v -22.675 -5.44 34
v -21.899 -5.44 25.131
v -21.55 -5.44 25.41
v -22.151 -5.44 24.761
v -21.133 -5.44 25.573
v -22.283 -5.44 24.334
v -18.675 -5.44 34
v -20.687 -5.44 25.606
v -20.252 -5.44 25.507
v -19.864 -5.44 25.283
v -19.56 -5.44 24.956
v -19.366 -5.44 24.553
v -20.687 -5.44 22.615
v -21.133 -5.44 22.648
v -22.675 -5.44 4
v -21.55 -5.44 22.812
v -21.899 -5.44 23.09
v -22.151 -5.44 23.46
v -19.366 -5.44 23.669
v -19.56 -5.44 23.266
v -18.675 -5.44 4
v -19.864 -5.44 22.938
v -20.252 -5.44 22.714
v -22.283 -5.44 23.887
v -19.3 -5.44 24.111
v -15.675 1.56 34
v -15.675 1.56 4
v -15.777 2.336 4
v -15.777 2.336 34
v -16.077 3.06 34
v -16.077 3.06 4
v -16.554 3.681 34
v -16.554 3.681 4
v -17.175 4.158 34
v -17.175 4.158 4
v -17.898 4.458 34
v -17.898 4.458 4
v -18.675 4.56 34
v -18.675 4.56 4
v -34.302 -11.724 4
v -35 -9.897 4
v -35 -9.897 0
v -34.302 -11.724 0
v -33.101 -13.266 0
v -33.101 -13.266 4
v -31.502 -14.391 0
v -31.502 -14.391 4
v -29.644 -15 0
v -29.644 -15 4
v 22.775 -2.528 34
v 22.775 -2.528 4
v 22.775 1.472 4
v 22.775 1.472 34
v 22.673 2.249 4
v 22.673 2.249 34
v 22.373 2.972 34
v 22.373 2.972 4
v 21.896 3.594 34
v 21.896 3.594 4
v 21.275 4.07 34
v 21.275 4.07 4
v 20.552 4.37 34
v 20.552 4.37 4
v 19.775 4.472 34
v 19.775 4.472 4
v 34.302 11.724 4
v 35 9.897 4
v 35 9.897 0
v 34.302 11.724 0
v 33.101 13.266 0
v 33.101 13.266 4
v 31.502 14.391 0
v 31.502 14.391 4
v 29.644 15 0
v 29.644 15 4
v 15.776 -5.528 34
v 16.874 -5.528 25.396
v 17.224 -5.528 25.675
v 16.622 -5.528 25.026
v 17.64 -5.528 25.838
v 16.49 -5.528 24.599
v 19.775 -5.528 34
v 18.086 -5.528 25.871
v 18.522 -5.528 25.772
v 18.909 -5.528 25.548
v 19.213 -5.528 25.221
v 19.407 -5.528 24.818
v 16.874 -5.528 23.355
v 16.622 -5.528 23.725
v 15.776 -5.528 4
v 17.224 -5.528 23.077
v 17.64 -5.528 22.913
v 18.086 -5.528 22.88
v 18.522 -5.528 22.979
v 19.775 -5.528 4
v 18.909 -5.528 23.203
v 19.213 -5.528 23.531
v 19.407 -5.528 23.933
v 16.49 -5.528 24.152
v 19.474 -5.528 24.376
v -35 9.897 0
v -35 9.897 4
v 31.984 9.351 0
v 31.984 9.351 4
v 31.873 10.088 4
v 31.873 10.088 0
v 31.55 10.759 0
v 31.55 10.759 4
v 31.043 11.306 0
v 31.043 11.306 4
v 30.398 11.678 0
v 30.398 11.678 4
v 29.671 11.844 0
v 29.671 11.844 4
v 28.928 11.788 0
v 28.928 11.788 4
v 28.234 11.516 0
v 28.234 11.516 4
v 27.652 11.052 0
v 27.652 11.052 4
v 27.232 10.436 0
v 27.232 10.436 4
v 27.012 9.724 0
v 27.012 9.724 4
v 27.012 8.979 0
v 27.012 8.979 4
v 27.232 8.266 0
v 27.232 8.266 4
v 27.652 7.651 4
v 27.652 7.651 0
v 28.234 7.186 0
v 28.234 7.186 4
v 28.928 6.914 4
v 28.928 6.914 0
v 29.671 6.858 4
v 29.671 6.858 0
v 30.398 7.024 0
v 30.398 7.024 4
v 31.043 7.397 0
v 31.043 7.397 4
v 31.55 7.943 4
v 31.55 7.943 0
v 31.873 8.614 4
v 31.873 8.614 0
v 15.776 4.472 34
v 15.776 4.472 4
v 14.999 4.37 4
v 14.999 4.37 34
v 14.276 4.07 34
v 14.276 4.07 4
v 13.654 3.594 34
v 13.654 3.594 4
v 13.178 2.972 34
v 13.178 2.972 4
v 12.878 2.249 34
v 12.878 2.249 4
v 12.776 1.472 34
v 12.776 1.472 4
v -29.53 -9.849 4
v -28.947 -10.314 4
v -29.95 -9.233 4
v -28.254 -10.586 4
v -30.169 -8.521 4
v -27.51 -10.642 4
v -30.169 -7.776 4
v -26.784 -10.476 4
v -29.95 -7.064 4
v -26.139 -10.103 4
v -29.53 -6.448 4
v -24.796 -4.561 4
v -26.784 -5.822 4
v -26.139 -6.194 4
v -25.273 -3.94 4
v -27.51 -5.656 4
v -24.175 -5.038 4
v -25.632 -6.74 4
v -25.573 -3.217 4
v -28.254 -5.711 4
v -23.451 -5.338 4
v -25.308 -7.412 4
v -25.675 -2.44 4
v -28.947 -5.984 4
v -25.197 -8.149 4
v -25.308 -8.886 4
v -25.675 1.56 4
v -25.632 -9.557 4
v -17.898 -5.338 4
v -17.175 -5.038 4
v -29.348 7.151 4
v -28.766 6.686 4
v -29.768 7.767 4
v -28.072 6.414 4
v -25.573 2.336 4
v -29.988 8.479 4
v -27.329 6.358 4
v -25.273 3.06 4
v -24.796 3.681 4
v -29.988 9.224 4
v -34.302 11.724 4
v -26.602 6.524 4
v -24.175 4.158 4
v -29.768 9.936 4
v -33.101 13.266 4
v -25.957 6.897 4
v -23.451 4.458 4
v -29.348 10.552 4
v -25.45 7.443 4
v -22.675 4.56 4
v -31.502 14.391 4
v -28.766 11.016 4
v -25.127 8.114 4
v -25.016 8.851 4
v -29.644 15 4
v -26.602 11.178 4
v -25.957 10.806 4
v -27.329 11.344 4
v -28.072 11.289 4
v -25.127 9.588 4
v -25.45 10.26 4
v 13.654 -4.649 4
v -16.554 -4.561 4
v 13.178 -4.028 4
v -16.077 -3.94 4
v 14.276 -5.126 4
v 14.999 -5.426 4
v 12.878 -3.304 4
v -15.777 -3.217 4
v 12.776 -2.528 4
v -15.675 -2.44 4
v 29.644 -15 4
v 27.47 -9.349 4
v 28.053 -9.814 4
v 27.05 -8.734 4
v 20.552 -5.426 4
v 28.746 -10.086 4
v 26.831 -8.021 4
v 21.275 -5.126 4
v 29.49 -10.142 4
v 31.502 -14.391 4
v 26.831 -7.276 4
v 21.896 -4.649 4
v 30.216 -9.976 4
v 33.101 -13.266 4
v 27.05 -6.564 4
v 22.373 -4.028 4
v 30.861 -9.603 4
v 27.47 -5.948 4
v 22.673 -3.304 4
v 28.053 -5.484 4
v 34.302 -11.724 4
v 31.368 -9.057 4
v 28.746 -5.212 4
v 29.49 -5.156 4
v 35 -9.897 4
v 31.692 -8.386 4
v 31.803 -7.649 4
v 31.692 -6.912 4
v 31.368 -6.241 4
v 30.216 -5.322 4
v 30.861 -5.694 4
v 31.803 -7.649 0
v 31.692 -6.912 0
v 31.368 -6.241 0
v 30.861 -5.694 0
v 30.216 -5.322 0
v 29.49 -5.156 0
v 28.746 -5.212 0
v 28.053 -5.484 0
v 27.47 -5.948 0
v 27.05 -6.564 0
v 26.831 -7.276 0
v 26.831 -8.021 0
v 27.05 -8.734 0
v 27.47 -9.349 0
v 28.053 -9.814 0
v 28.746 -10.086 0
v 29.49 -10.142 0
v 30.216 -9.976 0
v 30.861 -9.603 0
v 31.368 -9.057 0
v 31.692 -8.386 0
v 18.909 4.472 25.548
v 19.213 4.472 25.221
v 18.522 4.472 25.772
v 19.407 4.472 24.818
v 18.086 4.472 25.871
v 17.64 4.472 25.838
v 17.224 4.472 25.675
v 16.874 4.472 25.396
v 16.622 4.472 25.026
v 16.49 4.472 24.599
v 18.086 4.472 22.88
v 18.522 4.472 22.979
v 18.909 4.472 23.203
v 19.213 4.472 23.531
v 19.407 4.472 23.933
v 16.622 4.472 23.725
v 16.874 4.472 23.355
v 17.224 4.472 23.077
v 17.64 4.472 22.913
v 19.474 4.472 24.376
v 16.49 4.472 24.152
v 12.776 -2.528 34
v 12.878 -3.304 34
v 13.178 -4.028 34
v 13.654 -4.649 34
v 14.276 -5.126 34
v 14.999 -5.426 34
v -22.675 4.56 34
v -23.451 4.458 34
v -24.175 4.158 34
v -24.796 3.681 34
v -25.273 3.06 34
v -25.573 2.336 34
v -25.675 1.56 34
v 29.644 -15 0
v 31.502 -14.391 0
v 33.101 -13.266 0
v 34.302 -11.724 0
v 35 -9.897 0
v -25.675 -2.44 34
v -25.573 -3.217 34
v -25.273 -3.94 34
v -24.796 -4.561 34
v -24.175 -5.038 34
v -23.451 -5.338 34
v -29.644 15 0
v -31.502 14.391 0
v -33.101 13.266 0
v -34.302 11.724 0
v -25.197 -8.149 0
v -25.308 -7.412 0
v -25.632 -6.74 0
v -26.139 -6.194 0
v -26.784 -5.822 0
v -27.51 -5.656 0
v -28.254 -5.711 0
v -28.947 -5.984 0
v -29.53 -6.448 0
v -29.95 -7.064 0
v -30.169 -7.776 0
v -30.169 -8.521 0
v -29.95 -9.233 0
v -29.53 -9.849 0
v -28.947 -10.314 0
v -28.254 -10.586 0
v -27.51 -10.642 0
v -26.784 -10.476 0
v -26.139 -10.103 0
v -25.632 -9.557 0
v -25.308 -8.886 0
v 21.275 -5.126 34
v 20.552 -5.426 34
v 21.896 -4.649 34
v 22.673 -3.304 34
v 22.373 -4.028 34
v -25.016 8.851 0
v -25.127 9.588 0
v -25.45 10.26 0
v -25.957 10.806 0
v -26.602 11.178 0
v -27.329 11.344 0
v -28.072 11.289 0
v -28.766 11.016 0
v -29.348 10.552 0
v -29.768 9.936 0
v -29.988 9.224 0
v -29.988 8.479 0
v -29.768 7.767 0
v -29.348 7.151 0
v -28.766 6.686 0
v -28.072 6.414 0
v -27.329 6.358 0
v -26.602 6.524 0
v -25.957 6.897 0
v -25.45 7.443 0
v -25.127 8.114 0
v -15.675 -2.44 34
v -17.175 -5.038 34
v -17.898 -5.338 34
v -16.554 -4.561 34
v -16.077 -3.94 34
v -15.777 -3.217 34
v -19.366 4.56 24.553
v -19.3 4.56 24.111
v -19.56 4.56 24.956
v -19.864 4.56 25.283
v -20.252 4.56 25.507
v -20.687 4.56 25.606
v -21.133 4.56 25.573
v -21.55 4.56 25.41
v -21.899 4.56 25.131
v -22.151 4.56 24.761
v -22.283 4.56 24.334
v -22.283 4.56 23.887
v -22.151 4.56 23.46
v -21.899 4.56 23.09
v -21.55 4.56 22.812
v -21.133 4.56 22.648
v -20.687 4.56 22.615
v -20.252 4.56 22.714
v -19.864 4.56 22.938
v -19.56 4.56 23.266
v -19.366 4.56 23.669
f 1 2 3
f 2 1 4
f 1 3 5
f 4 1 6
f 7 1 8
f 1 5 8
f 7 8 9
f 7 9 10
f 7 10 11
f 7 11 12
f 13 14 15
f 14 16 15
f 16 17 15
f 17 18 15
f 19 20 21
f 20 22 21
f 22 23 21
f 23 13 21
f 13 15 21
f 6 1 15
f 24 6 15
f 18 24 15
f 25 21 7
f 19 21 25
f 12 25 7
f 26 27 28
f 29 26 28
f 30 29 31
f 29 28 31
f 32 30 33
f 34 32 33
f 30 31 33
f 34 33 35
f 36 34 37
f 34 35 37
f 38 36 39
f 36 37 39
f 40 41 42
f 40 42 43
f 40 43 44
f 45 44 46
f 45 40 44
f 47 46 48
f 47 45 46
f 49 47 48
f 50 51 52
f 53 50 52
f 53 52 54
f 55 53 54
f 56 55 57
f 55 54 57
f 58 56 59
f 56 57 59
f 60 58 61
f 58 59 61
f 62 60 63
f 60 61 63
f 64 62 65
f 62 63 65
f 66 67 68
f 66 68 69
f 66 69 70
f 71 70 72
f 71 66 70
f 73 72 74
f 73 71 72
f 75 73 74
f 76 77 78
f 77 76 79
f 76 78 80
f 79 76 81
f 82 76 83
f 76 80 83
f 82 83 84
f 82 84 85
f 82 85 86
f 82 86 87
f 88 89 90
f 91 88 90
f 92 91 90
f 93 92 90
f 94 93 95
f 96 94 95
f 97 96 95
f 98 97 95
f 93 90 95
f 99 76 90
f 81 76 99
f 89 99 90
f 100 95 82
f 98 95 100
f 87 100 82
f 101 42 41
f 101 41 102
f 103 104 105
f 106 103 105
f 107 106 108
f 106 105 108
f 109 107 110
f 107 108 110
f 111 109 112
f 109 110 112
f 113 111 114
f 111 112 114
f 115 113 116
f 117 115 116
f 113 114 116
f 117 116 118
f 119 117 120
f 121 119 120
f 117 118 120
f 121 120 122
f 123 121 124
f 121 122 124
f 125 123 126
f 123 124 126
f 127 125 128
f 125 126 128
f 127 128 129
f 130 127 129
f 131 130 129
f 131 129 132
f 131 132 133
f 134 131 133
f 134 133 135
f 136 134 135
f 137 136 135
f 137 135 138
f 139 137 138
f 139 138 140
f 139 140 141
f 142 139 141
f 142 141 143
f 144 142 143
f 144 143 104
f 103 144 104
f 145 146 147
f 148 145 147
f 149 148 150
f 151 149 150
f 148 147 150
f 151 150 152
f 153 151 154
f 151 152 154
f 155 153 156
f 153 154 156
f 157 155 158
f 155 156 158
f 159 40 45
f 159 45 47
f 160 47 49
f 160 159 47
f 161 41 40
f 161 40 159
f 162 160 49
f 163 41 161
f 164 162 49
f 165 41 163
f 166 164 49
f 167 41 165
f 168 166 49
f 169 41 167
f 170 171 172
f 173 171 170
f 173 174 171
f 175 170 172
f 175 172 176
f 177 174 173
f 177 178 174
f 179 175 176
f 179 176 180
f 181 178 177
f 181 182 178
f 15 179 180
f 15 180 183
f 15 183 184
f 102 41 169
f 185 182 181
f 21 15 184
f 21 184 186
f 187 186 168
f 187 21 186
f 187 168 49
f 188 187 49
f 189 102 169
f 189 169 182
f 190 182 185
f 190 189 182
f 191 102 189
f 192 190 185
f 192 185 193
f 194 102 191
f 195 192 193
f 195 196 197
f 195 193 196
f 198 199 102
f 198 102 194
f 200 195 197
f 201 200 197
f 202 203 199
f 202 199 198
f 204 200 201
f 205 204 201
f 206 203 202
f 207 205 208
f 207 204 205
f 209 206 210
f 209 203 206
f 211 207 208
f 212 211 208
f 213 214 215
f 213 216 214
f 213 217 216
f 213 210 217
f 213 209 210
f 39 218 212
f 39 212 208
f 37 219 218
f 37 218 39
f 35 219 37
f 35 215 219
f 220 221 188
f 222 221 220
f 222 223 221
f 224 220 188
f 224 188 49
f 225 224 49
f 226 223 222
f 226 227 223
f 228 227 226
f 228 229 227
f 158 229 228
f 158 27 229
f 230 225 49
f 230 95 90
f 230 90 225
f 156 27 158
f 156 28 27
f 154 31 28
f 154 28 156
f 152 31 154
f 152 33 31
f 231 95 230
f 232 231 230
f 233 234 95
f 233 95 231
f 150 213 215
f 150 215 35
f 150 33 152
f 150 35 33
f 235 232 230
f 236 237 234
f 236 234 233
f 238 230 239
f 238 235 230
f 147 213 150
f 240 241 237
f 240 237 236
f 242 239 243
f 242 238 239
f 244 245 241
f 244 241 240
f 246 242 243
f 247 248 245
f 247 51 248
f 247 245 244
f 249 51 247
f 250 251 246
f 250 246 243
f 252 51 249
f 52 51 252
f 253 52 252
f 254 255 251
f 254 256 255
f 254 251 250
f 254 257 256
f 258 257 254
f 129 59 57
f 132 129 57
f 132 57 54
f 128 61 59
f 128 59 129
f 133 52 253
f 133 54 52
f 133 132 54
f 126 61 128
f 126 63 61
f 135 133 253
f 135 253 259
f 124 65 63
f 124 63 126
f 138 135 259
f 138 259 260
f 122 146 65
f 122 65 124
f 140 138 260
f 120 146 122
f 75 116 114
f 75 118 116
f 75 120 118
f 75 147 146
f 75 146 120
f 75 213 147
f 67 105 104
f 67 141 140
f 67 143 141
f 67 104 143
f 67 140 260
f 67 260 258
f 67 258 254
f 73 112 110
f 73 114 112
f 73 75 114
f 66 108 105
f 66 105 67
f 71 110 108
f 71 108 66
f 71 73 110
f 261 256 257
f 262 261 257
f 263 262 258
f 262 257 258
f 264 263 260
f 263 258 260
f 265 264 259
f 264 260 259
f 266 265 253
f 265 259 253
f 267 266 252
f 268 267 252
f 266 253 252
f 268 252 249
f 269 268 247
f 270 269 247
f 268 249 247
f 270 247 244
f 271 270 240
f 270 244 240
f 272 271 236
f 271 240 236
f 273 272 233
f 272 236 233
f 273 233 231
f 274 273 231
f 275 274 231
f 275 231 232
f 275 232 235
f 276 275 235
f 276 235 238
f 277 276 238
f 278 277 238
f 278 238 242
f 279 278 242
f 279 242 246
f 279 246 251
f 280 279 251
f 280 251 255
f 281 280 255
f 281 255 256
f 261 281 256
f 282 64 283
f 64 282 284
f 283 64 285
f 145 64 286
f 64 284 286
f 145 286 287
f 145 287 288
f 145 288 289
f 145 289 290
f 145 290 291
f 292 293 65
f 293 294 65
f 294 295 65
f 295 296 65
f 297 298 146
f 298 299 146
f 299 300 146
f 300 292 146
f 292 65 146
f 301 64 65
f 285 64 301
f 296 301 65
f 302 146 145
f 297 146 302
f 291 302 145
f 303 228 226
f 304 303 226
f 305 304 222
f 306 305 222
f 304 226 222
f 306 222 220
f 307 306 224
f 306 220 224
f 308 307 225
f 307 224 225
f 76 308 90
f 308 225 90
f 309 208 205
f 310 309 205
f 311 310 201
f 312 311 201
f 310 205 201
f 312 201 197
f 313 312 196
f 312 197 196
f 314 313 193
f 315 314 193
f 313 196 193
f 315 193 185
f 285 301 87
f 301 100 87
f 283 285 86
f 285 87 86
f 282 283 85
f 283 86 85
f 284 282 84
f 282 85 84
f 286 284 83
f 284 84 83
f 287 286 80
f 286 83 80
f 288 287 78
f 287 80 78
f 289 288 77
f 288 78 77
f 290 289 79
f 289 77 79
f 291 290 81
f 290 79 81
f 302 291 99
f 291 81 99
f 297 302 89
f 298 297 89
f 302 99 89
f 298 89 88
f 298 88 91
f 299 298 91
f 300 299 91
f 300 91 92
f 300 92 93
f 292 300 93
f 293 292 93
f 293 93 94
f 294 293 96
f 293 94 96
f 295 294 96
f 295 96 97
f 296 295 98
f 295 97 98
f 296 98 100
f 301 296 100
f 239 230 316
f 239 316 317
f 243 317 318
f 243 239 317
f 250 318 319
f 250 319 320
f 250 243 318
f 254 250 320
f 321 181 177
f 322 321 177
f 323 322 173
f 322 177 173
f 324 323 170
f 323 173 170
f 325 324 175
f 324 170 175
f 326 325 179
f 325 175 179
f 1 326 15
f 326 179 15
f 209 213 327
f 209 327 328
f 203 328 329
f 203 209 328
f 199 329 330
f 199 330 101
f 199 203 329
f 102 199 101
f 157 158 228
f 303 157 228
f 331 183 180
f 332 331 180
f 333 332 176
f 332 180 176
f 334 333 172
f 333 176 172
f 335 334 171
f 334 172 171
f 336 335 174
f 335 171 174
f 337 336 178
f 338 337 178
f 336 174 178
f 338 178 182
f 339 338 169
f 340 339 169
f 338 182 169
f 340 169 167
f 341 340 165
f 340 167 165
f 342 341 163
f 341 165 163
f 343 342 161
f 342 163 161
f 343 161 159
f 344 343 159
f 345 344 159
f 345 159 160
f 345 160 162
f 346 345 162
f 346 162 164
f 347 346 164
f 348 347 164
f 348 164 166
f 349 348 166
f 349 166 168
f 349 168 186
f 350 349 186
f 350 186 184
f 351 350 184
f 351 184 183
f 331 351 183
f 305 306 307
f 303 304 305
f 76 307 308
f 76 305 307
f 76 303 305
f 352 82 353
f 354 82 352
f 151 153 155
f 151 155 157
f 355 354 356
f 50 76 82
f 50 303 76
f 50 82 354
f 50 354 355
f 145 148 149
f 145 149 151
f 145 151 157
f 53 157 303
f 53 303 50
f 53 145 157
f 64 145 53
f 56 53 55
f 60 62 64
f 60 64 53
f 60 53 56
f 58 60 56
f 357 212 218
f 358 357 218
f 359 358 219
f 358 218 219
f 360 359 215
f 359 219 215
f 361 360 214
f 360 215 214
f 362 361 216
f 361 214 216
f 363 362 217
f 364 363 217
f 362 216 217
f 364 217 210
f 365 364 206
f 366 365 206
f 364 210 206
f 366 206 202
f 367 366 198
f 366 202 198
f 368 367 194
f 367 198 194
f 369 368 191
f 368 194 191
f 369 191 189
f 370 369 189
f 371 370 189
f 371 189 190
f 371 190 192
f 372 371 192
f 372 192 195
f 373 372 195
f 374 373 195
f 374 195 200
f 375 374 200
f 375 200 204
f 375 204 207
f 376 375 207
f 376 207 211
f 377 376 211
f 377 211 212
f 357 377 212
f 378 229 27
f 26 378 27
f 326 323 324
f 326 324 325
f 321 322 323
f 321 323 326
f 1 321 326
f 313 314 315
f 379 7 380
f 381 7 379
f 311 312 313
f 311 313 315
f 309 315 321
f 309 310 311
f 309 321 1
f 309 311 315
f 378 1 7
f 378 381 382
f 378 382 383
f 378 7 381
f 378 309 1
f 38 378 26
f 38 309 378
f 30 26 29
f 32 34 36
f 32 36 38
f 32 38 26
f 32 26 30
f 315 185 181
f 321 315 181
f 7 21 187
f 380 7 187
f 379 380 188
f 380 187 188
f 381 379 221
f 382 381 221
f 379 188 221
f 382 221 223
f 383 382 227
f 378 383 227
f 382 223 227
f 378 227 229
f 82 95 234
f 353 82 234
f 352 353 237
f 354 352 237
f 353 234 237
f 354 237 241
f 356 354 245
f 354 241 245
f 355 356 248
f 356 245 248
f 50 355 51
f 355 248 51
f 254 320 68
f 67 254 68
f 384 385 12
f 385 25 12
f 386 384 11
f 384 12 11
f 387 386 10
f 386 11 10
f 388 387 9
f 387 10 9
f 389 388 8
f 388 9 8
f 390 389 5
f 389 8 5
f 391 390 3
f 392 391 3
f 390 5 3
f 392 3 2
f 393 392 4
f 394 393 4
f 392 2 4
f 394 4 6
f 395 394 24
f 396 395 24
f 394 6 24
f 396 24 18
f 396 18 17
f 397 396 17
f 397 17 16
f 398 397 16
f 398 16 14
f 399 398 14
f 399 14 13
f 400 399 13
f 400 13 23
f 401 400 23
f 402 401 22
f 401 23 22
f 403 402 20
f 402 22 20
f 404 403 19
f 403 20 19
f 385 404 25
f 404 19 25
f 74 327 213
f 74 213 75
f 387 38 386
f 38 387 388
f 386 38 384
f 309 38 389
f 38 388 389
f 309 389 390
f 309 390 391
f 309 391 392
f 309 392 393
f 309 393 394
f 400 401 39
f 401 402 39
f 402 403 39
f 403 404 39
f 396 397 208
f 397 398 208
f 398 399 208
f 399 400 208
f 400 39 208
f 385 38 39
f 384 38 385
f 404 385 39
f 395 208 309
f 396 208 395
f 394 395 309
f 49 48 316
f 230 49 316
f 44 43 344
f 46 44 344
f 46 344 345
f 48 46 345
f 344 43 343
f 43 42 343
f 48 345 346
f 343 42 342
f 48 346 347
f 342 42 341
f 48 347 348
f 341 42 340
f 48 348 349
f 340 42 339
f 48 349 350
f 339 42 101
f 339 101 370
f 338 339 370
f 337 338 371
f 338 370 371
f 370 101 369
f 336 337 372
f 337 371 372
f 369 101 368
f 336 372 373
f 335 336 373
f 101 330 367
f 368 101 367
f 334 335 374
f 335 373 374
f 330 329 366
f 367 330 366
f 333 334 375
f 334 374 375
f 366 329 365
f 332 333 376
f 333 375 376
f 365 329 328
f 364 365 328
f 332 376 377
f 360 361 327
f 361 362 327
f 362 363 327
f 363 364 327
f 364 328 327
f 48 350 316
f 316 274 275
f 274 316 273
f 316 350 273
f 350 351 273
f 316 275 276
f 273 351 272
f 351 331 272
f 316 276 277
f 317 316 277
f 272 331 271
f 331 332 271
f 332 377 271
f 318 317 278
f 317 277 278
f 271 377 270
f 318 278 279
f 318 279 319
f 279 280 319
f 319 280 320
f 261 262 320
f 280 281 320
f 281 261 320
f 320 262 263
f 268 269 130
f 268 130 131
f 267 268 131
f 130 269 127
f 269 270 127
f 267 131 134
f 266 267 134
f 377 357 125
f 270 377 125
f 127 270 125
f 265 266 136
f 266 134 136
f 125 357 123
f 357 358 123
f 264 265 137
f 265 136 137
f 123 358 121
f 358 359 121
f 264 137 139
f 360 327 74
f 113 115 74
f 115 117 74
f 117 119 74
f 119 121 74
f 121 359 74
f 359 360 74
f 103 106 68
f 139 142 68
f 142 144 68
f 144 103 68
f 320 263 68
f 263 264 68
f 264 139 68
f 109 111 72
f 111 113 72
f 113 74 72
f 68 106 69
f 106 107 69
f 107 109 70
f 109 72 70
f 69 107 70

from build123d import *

# Parameters (mm, degrees)
SKETCH_W        = 70
SKETCH_H        = 30
PAD_DEPTH       = 4
PAD001_DEPTH    = 30
SKETCH003_R     = 1.5
POCKET_DEPTH    = 10
SKETCH004_R     = 2.5
HOLE_DEPTH      = 25
POCKET001_DEPTH = 5


with BuildPart() as part:
    # Sketch → Pad (new body)
    with BuildSketch(Plane.XY):
        Rectangle(SKETCH_W, SKETCH_H)
    extrude(amount=PAD_DEPTH)

    # Sketch001 → Pad001 (join)
    with BuildSketch(Plane.XY.offset(4)):
        with BuildLine():
            Line((-25.674894, 1.559909), (-25.674894, -2.440091))
            ThreePointArc((-25.674894, -2.440091), (-24.796214, -4.561411), (-22.674894, -5.440091))
            Line((-22.674894, -5.440091), (-18.674894, -5.440091))
            ThreePointArc((-18.674894, -5.440091), (-16.553574, -4.561411), (-15.674894, -2.440091))
            Line((-15.674894, -2.440091), (-15.674894, 1.559909))
            ThreePointArc((-15.674894, 1.559909), (-16.553574, 3.681229), (-18.674894, 4.559909))
            Line((-18.674894, 4.559909), (-22.674894, 4.559909))
            ThreePointArc((-22.674894, 4.559909), (-24.796214, 3.681229), (-25.674894, 1.559909))
        make_face()
        with BuildLine():
            Line((12.775577, 1.472262), (12.775577, -2.527736))
            ThreePointArc((12.775577, -2.527736), (13.654257, -4.649056), (15.775577, -5.527736))
            Line((15.775577, -5.527736), (19.775106, -5.527736))
            ThreePointArc((19.775106, -5.527736), (21.896426, -4.649056), (22.775106, -2.527736))
            Line((22.775106, -2.527736), (22.775106, 1.472262))
            ThreePointArc((22.775106, 1.472262), (21.896426, 3.593582), (19.775106, 4.472262))
            Line((19.775106, 4.472262), (15.775577, 4.472262))
            ThreePointArc((15.775577, 4.472262), (13.654257, 3.593582), (12.775577, 1.472262))
        make_face()
    extrude(amount=PAD001_DEPTH)

    # Sketch003 → Pocket (cut, symmetric)
    with BuildSketch(Plane.XZ.offset(3.853326)):
        with Locations((-20.799536, 24.110664)):
            Circle(SKETCH003_R)
        with Locations((17.973553, 24.375628)):
            Circle(SKETCH003_R)
    extrude(amount=POCKET_DEPTH, both=True, mode=Mode.SUBTRACT)

    # Sketch004 (on Face5 of Pocket) → Hole (cut)
    with BuildSketch(Plane.XY.offset(4)):
        with Locations((29.484156, 9.351145)):
            Circle(SKETCH004_R)
        with Locations((29.302721, -7.648855)):
            Circle(SKETCH004_R)
        with Locations((-27.515844, 8.851251)):
            Circle(SKETCH004_R)
        with Locations((-27.697279, -8.148749)):
            Circle(SKETCH004_R)
    extrude(amount=-HOLE_DEPTH, mode=Mode.SUBTRACT)

    # Sketch005 (on Face5 of Hole) → Pocket001 (cut)
    with BuildSketch(Plane.XY.offset(4)):
        with BuildLine():
            ThreePointArc((-29.5254, 15.019082), (-33.217927, 13.152465), (-35.081265, 9.458282))
            Line((-35.081265, 9.458282), (-35.081265, 15.019082))
            Line((-35.081265, 15.019082), (-29.5254, 15.019082))
        make_face()
        with BuildLine():
            ThreePointArc((35.081265, 9.458282), (33.217927, 13.152465), (29.5254, 15.019082))
            Line((35.081265, 15.019082), (29.5254, 15.019082))
            Line((35.081265, 9.458282), (35.081265, 15.019082))
        make_face()
        with BuildLine():
            ThreePointArc((-35.081265, -9.458282), (-33.217927, -13.152465), (-29.5254, -15.019082))
            Line((-35.081265, -15.019082), (-29.5254, -15.019082))
            Line((-35.081265, -9.458282), (-35.081265, -15.019082))
        make_face()
        with BuildLine():
            ThreePointArc((29.5254, -15.019082), (33.217927, -13.152465), (35.081265, -9.458282))
            Line((35.081265, -9.458282), (35.081265, -15.019082))
            Line((35.081265, -15.019082), (29.5254, -15.019082))
        make_face()
    extrude(amount=-POCKET001_DEPTH, mode=Mode.SUBTRACT)


solid = part.part
